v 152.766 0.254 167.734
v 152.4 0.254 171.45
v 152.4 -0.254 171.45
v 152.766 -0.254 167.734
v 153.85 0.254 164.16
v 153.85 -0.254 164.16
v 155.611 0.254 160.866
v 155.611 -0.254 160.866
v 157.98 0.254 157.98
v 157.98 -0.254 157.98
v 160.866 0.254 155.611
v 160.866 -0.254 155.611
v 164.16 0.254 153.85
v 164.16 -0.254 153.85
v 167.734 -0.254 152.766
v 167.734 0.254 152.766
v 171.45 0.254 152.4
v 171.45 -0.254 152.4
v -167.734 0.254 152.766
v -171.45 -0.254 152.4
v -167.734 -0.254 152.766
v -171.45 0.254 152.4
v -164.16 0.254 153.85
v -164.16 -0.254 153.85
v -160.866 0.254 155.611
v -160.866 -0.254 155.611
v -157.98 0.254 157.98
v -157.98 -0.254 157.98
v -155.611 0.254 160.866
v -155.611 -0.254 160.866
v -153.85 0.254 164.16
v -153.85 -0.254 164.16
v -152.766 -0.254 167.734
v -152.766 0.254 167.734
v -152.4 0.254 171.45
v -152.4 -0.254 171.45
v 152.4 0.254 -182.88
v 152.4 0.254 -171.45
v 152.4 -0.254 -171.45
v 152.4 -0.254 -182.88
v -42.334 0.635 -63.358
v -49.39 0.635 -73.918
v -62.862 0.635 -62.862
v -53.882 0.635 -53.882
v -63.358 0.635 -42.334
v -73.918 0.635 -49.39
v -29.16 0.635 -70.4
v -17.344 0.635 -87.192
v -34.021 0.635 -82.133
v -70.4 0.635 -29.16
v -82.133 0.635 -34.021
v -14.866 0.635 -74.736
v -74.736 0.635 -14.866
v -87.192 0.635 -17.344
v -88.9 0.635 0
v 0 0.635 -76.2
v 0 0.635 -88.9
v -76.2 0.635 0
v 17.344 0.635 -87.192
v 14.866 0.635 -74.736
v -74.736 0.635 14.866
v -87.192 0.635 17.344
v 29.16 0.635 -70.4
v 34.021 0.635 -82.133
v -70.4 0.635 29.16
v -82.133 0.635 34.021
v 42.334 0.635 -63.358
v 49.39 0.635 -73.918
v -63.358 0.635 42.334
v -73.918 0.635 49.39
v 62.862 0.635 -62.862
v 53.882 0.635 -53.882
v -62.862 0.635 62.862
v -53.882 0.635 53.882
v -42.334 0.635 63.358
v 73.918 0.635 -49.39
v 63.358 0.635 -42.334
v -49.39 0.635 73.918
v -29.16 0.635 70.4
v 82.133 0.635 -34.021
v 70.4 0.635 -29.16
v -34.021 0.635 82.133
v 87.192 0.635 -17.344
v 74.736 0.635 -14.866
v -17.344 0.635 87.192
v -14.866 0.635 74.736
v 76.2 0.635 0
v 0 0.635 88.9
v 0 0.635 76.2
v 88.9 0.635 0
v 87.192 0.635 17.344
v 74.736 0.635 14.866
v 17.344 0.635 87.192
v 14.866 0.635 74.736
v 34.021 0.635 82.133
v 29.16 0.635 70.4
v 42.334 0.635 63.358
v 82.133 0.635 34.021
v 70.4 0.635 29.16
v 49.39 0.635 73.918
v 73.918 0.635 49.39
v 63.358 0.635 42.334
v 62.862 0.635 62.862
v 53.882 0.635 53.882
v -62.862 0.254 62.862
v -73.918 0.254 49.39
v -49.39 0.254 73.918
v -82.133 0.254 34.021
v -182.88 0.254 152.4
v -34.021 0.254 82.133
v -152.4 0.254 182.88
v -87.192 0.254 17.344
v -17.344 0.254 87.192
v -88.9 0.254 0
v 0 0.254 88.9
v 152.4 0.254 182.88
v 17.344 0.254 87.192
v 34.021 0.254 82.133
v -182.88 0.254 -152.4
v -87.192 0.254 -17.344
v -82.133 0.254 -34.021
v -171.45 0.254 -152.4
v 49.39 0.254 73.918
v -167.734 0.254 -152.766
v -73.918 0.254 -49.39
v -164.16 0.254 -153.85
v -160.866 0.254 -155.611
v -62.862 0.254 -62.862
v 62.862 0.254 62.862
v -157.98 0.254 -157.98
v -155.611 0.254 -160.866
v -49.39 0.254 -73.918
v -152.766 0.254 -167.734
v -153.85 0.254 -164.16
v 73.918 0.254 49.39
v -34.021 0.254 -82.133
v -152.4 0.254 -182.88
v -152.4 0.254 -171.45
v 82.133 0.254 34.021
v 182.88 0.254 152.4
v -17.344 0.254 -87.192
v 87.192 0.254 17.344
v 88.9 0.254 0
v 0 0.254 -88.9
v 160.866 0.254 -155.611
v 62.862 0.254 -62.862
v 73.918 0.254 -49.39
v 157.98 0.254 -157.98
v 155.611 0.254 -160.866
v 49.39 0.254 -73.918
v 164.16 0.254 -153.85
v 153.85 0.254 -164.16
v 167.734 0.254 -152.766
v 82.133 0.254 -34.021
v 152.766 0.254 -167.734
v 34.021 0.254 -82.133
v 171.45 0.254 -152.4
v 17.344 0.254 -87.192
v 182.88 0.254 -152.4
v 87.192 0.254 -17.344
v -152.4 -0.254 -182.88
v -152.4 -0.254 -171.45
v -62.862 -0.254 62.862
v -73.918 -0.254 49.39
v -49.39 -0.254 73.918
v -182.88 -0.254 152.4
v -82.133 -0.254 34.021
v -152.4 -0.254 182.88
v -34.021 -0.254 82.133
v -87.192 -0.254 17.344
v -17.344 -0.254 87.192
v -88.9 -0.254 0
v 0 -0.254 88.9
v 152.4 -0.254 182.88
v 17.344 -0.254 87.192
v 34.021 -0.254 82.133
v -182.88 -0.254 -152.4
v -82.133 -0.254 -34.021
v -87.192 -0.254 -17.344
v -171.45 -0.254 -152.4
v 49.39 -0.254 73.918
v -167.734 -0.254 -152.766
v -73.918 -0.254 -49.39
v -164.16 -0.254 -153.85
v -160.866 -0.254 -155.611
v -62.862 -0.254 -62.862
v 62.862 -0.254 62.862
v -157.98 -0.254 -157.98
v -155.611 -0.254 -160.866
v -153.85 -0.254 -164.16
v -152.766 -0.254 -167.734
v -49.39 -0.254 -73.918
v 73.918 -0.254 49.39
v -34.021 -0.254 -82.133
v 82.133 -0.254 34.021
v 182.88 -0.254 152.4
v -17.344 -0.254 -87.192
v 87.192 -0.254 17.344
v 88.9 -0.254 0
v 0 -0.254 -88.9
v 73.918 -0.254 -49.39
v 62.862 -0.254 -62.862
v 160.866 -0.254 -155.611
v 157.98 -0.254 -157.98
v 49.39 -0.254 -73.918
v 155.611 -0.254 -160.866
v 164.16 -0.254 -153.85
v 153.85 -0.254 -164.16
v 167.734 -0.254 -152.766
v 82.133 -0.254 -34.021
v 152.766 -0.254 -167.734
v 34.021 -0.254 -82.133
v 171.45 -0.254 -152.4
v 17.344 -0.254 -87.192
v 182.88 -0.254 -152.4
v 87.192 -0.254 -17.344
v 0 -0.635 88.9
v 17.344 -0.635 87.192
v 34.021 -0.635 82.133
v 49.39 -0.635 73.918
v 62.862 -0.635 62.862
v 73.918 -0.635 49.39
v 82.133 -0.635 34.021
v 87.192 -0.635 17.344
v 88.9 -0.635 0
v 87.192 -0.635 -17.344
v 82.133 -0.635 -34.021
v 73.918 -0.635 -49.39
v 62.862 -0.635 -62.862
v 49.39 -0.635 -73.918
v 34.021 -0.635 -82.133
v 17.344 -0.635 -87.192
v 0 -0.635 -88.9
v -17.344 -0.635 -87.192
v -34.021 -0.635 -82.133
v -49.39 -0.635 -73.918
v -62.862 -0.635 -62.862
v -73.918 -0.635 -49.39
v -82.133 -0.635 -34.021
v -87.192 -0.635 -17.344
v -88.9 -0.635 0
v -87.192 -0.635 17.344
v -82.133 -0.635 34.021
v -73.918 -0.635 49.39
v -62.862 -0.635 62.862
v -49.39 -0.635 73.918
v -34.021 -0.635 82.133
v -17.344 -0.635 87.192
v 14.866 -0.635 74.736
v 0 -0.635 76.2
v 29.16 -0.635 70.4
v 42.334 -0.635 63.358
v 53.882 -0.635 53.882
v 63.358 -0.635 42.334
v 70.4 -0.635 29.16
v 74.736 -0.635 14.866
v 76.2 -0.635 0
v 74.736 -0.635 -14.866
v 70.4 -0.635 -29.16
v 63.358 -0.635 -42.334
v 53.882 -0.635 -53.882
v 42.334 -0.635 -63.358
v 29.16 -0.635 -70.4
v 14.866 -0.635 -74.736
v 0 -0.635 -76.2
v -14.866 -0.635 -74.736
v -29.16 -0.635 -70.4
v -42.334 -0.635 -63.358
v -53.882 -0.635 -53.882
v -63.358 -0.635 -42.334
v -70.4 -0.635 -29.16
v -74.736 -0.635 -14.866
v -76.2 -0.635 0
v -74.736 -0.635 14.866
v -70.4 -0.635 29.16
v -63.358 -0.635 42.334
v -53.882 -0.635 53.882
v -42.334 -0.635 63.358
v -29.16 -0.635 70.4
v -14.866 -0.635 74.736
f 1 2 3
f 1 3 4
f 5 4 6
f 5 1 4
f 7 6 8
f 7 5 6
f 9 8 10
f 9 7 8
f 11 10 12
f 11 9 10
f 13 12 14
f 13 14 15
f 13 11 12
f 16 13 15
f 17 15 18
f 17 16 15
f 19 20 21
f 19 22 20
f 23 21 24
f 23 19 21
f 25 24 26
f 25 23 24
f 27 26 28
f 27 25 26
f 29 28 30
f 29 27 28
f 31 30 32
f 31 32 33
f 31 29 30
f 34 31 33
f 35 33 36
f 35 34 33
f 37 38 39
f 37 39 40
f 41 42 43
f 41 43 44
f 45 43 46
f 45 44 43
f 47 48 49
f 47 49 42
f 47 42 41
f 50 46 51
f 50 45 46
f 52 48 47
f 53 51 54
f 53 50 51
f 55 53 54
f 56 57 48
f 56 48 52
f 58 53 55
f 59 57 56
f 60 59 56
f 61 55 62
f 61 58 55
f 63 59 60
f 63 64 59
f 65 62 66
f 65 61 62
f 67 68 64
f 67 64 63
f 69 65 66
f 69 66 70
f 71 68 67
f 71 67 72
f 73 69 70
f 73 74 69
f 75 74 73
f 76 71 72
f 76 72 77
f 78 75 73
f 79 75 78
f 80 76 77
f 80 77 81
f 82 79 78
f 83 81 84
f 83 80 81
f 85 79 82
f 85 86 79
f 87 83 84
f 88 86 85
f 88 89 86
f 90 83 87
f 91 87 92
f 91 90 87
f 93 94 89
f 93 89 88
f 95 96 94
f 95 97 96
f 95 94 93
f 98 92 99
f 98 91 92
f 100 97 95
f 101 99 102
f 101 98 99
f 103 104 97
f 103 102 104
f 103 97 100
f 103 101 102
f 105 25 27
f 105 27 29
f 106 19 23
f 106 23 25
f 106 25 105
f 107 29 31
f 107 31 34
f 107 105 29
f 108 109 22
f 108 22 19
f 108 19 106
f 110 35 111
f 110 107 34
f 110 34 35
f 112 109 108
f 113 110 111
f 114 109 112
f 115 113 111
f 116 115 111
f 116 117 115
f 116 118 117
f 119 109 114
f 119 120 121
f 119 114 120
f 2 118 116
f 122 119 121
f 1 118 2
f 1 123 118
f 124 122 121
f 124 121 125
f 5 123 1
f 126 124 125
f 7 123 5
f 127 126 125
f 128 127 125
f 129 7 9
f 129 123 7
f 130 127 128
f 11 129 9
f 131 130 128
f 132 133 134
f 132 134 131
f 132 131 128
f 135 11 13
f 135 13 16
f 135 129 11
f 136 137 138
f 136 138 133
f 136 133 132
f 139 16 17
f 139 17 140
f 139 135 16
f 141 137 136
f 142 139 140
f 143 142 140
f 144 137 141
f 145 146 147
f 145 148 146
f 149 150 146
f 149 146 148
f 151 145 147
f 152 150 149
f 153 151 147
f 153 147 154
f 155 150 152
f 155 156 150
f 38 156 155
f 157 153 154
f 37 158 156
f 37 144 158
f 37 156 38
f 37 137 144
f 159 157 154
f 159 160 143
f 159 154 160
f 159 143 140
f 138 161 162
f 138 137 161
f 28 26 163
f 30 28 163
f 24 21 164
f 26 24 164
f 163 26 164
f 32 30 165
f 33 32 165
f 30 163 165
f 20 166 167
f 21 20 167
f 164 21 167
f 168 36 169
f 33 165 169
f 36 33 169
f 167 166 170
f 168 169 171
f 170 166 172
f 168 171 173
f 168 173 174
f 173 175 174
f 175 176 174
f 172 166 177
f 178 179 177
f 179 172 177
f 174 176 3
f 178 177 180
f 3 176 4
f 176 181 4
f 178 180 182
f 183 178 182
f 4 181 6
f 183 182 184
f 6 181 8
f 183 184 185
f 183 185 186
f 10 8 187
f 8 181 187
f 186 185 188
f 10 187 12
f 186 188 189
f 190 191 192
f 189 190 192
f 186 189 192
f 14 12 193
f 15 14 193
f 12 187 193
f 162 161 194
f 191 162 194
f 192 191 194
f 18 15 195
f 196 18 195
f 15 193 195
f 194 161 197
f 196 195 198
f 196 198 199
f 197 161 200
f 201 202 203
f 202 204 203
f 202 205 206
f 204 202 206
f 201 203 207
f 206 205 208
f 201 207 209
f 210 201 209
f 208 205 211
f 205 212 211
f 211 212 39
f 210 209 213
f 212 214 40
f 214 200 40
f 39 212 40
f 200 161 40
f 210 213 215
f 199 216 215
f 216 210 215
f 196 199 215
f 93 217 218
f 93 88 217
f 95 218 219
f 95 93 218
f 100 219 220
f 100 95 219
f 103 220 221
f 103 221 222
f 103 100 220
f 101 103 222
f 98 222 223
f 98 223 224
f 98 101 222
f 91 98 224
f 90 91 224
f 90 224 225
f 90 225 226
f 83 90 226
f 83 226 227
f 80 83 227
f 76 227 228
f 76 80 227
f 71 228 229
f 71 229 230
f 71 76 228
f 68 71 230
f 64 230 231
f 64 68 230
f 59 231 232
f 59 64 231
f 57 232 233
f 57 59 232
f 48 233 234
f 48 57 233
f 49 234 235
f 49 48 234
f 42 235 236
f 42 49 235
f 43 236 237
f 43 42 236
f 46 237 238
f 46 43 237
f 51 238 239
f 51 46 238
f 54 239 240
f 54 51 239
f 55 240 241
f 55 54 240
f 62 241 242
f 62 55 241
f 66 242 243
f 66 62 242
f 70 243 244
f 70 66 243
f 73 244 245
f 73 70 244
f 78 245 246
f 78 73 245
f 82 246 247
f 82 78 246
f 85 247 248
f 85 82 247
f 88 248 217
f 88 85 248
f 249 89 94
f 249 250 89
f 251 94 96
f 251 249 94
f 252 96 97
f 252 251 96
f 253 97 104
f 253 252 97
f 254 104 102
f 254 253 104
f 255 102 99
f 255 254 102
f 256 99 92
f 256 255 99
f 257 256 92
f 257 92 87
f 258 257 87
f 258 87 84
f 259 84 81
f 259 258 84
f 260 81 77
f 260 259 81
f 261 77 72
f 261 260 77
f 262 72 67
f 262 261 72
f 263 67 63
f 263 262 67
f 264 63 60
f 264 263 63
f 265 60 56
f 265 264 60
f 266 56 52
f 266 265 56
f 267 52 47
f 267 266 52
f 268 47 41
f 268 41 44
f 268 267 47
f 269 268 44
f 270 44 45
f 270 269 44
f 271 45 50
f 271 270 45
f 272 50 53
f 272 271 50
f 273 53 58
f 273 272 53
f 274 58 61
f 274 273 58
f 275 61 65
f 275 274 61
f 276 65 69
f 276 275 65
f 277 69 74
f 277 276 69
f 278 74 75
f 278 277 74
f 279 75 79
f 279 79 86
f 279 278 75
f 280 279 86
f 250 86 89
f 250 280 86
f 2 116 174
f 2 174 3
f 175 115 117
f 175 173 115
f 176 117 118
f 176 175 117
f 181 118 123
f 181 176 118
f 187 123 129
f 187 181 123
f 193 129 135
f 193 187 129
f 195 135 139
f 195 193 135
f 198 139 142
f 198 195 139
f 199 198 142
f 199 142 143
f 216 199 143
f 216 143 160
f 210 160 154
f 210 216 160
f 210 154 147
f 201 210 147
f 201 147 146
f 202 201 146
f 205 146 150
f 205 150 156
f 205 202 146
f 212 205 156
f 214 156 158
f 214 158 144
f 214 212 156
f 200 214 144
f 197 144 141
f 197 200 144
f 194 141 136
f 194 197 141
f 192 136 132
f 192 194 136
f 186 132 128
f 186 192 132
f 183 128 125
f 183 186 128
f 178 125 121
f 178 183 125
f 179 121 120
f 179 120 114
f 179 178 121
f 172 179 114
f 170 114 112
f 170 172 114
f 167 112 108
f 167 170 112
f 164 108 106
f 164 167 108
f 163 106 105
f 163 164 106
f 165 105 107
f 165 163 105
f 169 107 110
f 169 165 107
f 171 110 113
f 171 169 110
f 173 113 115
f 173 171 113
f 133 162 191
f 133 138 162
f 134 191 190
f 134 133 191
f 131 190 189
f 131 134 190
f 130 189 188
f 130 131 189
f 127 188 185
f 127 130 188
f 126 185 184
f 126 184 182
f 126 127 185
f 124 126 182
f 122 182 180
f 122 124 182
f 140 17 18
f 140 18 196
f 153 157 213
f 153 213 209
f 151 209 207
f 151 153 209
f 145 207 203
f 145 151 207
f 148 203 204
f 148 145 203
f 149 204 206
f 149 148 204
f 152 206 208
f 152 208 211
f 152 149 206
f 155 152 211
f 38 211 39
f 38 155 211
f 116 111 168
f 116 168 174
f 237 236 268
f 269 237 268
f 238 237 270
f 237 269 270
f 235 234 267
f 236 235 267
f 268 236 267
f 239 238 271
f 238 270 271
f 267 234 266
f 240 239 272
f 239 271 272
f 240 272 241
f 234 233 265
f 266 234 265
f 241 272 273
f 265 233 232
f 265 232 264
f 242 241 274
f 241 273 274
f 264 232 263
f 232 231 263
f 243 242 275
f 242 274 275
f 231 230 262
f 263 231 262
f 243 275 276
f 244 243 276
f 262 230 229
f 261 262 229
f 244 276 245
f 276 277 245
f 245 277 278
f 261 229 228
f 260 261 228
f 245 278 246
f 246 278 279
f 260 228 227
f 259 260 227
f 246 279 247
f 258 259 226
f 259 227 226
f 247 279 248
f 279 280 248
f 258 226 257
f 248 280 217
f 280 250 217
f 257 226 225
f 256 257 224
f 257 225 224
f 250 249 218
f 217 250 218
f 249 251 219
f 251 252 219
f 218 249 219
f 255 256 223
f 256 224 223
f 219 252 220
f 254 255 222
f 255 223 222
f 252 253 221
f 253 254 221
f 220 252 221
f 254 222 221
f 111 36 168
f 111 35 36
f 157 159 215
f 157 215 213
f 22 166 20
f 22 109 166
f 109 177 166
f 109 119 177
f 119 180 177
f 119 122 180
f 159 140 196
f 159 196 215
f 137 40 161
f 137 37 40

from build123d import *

# Parameters (mm, degrees)
SKETCH1_R           = 88.9
BOSS_EXTRUDE1_DEPTH = 0.254
SKETCH1_4_R         = 88.9
SKETCH1_4_R_2       = 76.2
BOSS_EXTRUDE2_DEPTH = 0.635


with BuildPart() as part:
    # Sketch1 → Boss-Extrude1 (new, symmetric)
    with BuildSketch(Plane(origin=(0, 0, 0), x_dir=(1, 0, 0), z_dir=(0, 1, 0))):
        with BuildLine():
            ThreePointArc((-171.45, -152.4), (-157.979615818, -157.979615818), (-152.4, -171.45))
            Line((-152.4, -171.45), (-152.4, -182.88))
            Line((-152.4, -182.88), (152.4, -182.88))
            Line((152.4, -182.88), (152.4, -171.45))
            ThreePointArc((152.4, -171.45), (157.979615818, -157.979615818), (171.45, -152.4))
            Line((171.45, -152.4), (182.88, -152.4))
            Line((182.88, -152.4), (182.88, 152.4))
            Line((182.88, 152.4), (171.45, 152.4))
            ThreePointArc((171.45, 152.4), (157.979615818, 157.979615818), (152.4, 171.45))
            Line((152.4, 171.45), (152.4, 182.88))
            Line((152.4, 182.88), (-152.4, 182.88))
            Line((-152.4, 182.88), (-152.4, 171.45))
            ThreePointArc((-152.4, 171.45), (-157.979615818, 157.979615818), (-171.45, 152.4))
            Line((-171.45, 152.4), (-182.88, 152.4))
            Line((-182.88, 152.4), (-182.88, -152.4))
            Line((-182.88, -152.4), (-171.45, -152.4))
        make_face()
        Circle(SKETCH1_R, mode=Mode.SUBTRACT)
    extrude(amount=BOSS_EXTRUDE1_DEPTH, both=True)


with BuildPart() as body_2:
    # Sketch1<4> → Boss-Extrude2 (new, symmetric)
    with BuildSketch(Plane(origin=(0, 0, 0), x_dir=(1, 0, 0), z_dir=(0, 1, 0))):
        Circle(SKETCH1_4_R)
        Circle(SKETCH1_4_R_2, mode=Mode.SUBTRACT)
    extrude(amount=BOSS_EXTRUDE2_DEPTH, both=True)


solid = Compound([part.part, body_2.part])
